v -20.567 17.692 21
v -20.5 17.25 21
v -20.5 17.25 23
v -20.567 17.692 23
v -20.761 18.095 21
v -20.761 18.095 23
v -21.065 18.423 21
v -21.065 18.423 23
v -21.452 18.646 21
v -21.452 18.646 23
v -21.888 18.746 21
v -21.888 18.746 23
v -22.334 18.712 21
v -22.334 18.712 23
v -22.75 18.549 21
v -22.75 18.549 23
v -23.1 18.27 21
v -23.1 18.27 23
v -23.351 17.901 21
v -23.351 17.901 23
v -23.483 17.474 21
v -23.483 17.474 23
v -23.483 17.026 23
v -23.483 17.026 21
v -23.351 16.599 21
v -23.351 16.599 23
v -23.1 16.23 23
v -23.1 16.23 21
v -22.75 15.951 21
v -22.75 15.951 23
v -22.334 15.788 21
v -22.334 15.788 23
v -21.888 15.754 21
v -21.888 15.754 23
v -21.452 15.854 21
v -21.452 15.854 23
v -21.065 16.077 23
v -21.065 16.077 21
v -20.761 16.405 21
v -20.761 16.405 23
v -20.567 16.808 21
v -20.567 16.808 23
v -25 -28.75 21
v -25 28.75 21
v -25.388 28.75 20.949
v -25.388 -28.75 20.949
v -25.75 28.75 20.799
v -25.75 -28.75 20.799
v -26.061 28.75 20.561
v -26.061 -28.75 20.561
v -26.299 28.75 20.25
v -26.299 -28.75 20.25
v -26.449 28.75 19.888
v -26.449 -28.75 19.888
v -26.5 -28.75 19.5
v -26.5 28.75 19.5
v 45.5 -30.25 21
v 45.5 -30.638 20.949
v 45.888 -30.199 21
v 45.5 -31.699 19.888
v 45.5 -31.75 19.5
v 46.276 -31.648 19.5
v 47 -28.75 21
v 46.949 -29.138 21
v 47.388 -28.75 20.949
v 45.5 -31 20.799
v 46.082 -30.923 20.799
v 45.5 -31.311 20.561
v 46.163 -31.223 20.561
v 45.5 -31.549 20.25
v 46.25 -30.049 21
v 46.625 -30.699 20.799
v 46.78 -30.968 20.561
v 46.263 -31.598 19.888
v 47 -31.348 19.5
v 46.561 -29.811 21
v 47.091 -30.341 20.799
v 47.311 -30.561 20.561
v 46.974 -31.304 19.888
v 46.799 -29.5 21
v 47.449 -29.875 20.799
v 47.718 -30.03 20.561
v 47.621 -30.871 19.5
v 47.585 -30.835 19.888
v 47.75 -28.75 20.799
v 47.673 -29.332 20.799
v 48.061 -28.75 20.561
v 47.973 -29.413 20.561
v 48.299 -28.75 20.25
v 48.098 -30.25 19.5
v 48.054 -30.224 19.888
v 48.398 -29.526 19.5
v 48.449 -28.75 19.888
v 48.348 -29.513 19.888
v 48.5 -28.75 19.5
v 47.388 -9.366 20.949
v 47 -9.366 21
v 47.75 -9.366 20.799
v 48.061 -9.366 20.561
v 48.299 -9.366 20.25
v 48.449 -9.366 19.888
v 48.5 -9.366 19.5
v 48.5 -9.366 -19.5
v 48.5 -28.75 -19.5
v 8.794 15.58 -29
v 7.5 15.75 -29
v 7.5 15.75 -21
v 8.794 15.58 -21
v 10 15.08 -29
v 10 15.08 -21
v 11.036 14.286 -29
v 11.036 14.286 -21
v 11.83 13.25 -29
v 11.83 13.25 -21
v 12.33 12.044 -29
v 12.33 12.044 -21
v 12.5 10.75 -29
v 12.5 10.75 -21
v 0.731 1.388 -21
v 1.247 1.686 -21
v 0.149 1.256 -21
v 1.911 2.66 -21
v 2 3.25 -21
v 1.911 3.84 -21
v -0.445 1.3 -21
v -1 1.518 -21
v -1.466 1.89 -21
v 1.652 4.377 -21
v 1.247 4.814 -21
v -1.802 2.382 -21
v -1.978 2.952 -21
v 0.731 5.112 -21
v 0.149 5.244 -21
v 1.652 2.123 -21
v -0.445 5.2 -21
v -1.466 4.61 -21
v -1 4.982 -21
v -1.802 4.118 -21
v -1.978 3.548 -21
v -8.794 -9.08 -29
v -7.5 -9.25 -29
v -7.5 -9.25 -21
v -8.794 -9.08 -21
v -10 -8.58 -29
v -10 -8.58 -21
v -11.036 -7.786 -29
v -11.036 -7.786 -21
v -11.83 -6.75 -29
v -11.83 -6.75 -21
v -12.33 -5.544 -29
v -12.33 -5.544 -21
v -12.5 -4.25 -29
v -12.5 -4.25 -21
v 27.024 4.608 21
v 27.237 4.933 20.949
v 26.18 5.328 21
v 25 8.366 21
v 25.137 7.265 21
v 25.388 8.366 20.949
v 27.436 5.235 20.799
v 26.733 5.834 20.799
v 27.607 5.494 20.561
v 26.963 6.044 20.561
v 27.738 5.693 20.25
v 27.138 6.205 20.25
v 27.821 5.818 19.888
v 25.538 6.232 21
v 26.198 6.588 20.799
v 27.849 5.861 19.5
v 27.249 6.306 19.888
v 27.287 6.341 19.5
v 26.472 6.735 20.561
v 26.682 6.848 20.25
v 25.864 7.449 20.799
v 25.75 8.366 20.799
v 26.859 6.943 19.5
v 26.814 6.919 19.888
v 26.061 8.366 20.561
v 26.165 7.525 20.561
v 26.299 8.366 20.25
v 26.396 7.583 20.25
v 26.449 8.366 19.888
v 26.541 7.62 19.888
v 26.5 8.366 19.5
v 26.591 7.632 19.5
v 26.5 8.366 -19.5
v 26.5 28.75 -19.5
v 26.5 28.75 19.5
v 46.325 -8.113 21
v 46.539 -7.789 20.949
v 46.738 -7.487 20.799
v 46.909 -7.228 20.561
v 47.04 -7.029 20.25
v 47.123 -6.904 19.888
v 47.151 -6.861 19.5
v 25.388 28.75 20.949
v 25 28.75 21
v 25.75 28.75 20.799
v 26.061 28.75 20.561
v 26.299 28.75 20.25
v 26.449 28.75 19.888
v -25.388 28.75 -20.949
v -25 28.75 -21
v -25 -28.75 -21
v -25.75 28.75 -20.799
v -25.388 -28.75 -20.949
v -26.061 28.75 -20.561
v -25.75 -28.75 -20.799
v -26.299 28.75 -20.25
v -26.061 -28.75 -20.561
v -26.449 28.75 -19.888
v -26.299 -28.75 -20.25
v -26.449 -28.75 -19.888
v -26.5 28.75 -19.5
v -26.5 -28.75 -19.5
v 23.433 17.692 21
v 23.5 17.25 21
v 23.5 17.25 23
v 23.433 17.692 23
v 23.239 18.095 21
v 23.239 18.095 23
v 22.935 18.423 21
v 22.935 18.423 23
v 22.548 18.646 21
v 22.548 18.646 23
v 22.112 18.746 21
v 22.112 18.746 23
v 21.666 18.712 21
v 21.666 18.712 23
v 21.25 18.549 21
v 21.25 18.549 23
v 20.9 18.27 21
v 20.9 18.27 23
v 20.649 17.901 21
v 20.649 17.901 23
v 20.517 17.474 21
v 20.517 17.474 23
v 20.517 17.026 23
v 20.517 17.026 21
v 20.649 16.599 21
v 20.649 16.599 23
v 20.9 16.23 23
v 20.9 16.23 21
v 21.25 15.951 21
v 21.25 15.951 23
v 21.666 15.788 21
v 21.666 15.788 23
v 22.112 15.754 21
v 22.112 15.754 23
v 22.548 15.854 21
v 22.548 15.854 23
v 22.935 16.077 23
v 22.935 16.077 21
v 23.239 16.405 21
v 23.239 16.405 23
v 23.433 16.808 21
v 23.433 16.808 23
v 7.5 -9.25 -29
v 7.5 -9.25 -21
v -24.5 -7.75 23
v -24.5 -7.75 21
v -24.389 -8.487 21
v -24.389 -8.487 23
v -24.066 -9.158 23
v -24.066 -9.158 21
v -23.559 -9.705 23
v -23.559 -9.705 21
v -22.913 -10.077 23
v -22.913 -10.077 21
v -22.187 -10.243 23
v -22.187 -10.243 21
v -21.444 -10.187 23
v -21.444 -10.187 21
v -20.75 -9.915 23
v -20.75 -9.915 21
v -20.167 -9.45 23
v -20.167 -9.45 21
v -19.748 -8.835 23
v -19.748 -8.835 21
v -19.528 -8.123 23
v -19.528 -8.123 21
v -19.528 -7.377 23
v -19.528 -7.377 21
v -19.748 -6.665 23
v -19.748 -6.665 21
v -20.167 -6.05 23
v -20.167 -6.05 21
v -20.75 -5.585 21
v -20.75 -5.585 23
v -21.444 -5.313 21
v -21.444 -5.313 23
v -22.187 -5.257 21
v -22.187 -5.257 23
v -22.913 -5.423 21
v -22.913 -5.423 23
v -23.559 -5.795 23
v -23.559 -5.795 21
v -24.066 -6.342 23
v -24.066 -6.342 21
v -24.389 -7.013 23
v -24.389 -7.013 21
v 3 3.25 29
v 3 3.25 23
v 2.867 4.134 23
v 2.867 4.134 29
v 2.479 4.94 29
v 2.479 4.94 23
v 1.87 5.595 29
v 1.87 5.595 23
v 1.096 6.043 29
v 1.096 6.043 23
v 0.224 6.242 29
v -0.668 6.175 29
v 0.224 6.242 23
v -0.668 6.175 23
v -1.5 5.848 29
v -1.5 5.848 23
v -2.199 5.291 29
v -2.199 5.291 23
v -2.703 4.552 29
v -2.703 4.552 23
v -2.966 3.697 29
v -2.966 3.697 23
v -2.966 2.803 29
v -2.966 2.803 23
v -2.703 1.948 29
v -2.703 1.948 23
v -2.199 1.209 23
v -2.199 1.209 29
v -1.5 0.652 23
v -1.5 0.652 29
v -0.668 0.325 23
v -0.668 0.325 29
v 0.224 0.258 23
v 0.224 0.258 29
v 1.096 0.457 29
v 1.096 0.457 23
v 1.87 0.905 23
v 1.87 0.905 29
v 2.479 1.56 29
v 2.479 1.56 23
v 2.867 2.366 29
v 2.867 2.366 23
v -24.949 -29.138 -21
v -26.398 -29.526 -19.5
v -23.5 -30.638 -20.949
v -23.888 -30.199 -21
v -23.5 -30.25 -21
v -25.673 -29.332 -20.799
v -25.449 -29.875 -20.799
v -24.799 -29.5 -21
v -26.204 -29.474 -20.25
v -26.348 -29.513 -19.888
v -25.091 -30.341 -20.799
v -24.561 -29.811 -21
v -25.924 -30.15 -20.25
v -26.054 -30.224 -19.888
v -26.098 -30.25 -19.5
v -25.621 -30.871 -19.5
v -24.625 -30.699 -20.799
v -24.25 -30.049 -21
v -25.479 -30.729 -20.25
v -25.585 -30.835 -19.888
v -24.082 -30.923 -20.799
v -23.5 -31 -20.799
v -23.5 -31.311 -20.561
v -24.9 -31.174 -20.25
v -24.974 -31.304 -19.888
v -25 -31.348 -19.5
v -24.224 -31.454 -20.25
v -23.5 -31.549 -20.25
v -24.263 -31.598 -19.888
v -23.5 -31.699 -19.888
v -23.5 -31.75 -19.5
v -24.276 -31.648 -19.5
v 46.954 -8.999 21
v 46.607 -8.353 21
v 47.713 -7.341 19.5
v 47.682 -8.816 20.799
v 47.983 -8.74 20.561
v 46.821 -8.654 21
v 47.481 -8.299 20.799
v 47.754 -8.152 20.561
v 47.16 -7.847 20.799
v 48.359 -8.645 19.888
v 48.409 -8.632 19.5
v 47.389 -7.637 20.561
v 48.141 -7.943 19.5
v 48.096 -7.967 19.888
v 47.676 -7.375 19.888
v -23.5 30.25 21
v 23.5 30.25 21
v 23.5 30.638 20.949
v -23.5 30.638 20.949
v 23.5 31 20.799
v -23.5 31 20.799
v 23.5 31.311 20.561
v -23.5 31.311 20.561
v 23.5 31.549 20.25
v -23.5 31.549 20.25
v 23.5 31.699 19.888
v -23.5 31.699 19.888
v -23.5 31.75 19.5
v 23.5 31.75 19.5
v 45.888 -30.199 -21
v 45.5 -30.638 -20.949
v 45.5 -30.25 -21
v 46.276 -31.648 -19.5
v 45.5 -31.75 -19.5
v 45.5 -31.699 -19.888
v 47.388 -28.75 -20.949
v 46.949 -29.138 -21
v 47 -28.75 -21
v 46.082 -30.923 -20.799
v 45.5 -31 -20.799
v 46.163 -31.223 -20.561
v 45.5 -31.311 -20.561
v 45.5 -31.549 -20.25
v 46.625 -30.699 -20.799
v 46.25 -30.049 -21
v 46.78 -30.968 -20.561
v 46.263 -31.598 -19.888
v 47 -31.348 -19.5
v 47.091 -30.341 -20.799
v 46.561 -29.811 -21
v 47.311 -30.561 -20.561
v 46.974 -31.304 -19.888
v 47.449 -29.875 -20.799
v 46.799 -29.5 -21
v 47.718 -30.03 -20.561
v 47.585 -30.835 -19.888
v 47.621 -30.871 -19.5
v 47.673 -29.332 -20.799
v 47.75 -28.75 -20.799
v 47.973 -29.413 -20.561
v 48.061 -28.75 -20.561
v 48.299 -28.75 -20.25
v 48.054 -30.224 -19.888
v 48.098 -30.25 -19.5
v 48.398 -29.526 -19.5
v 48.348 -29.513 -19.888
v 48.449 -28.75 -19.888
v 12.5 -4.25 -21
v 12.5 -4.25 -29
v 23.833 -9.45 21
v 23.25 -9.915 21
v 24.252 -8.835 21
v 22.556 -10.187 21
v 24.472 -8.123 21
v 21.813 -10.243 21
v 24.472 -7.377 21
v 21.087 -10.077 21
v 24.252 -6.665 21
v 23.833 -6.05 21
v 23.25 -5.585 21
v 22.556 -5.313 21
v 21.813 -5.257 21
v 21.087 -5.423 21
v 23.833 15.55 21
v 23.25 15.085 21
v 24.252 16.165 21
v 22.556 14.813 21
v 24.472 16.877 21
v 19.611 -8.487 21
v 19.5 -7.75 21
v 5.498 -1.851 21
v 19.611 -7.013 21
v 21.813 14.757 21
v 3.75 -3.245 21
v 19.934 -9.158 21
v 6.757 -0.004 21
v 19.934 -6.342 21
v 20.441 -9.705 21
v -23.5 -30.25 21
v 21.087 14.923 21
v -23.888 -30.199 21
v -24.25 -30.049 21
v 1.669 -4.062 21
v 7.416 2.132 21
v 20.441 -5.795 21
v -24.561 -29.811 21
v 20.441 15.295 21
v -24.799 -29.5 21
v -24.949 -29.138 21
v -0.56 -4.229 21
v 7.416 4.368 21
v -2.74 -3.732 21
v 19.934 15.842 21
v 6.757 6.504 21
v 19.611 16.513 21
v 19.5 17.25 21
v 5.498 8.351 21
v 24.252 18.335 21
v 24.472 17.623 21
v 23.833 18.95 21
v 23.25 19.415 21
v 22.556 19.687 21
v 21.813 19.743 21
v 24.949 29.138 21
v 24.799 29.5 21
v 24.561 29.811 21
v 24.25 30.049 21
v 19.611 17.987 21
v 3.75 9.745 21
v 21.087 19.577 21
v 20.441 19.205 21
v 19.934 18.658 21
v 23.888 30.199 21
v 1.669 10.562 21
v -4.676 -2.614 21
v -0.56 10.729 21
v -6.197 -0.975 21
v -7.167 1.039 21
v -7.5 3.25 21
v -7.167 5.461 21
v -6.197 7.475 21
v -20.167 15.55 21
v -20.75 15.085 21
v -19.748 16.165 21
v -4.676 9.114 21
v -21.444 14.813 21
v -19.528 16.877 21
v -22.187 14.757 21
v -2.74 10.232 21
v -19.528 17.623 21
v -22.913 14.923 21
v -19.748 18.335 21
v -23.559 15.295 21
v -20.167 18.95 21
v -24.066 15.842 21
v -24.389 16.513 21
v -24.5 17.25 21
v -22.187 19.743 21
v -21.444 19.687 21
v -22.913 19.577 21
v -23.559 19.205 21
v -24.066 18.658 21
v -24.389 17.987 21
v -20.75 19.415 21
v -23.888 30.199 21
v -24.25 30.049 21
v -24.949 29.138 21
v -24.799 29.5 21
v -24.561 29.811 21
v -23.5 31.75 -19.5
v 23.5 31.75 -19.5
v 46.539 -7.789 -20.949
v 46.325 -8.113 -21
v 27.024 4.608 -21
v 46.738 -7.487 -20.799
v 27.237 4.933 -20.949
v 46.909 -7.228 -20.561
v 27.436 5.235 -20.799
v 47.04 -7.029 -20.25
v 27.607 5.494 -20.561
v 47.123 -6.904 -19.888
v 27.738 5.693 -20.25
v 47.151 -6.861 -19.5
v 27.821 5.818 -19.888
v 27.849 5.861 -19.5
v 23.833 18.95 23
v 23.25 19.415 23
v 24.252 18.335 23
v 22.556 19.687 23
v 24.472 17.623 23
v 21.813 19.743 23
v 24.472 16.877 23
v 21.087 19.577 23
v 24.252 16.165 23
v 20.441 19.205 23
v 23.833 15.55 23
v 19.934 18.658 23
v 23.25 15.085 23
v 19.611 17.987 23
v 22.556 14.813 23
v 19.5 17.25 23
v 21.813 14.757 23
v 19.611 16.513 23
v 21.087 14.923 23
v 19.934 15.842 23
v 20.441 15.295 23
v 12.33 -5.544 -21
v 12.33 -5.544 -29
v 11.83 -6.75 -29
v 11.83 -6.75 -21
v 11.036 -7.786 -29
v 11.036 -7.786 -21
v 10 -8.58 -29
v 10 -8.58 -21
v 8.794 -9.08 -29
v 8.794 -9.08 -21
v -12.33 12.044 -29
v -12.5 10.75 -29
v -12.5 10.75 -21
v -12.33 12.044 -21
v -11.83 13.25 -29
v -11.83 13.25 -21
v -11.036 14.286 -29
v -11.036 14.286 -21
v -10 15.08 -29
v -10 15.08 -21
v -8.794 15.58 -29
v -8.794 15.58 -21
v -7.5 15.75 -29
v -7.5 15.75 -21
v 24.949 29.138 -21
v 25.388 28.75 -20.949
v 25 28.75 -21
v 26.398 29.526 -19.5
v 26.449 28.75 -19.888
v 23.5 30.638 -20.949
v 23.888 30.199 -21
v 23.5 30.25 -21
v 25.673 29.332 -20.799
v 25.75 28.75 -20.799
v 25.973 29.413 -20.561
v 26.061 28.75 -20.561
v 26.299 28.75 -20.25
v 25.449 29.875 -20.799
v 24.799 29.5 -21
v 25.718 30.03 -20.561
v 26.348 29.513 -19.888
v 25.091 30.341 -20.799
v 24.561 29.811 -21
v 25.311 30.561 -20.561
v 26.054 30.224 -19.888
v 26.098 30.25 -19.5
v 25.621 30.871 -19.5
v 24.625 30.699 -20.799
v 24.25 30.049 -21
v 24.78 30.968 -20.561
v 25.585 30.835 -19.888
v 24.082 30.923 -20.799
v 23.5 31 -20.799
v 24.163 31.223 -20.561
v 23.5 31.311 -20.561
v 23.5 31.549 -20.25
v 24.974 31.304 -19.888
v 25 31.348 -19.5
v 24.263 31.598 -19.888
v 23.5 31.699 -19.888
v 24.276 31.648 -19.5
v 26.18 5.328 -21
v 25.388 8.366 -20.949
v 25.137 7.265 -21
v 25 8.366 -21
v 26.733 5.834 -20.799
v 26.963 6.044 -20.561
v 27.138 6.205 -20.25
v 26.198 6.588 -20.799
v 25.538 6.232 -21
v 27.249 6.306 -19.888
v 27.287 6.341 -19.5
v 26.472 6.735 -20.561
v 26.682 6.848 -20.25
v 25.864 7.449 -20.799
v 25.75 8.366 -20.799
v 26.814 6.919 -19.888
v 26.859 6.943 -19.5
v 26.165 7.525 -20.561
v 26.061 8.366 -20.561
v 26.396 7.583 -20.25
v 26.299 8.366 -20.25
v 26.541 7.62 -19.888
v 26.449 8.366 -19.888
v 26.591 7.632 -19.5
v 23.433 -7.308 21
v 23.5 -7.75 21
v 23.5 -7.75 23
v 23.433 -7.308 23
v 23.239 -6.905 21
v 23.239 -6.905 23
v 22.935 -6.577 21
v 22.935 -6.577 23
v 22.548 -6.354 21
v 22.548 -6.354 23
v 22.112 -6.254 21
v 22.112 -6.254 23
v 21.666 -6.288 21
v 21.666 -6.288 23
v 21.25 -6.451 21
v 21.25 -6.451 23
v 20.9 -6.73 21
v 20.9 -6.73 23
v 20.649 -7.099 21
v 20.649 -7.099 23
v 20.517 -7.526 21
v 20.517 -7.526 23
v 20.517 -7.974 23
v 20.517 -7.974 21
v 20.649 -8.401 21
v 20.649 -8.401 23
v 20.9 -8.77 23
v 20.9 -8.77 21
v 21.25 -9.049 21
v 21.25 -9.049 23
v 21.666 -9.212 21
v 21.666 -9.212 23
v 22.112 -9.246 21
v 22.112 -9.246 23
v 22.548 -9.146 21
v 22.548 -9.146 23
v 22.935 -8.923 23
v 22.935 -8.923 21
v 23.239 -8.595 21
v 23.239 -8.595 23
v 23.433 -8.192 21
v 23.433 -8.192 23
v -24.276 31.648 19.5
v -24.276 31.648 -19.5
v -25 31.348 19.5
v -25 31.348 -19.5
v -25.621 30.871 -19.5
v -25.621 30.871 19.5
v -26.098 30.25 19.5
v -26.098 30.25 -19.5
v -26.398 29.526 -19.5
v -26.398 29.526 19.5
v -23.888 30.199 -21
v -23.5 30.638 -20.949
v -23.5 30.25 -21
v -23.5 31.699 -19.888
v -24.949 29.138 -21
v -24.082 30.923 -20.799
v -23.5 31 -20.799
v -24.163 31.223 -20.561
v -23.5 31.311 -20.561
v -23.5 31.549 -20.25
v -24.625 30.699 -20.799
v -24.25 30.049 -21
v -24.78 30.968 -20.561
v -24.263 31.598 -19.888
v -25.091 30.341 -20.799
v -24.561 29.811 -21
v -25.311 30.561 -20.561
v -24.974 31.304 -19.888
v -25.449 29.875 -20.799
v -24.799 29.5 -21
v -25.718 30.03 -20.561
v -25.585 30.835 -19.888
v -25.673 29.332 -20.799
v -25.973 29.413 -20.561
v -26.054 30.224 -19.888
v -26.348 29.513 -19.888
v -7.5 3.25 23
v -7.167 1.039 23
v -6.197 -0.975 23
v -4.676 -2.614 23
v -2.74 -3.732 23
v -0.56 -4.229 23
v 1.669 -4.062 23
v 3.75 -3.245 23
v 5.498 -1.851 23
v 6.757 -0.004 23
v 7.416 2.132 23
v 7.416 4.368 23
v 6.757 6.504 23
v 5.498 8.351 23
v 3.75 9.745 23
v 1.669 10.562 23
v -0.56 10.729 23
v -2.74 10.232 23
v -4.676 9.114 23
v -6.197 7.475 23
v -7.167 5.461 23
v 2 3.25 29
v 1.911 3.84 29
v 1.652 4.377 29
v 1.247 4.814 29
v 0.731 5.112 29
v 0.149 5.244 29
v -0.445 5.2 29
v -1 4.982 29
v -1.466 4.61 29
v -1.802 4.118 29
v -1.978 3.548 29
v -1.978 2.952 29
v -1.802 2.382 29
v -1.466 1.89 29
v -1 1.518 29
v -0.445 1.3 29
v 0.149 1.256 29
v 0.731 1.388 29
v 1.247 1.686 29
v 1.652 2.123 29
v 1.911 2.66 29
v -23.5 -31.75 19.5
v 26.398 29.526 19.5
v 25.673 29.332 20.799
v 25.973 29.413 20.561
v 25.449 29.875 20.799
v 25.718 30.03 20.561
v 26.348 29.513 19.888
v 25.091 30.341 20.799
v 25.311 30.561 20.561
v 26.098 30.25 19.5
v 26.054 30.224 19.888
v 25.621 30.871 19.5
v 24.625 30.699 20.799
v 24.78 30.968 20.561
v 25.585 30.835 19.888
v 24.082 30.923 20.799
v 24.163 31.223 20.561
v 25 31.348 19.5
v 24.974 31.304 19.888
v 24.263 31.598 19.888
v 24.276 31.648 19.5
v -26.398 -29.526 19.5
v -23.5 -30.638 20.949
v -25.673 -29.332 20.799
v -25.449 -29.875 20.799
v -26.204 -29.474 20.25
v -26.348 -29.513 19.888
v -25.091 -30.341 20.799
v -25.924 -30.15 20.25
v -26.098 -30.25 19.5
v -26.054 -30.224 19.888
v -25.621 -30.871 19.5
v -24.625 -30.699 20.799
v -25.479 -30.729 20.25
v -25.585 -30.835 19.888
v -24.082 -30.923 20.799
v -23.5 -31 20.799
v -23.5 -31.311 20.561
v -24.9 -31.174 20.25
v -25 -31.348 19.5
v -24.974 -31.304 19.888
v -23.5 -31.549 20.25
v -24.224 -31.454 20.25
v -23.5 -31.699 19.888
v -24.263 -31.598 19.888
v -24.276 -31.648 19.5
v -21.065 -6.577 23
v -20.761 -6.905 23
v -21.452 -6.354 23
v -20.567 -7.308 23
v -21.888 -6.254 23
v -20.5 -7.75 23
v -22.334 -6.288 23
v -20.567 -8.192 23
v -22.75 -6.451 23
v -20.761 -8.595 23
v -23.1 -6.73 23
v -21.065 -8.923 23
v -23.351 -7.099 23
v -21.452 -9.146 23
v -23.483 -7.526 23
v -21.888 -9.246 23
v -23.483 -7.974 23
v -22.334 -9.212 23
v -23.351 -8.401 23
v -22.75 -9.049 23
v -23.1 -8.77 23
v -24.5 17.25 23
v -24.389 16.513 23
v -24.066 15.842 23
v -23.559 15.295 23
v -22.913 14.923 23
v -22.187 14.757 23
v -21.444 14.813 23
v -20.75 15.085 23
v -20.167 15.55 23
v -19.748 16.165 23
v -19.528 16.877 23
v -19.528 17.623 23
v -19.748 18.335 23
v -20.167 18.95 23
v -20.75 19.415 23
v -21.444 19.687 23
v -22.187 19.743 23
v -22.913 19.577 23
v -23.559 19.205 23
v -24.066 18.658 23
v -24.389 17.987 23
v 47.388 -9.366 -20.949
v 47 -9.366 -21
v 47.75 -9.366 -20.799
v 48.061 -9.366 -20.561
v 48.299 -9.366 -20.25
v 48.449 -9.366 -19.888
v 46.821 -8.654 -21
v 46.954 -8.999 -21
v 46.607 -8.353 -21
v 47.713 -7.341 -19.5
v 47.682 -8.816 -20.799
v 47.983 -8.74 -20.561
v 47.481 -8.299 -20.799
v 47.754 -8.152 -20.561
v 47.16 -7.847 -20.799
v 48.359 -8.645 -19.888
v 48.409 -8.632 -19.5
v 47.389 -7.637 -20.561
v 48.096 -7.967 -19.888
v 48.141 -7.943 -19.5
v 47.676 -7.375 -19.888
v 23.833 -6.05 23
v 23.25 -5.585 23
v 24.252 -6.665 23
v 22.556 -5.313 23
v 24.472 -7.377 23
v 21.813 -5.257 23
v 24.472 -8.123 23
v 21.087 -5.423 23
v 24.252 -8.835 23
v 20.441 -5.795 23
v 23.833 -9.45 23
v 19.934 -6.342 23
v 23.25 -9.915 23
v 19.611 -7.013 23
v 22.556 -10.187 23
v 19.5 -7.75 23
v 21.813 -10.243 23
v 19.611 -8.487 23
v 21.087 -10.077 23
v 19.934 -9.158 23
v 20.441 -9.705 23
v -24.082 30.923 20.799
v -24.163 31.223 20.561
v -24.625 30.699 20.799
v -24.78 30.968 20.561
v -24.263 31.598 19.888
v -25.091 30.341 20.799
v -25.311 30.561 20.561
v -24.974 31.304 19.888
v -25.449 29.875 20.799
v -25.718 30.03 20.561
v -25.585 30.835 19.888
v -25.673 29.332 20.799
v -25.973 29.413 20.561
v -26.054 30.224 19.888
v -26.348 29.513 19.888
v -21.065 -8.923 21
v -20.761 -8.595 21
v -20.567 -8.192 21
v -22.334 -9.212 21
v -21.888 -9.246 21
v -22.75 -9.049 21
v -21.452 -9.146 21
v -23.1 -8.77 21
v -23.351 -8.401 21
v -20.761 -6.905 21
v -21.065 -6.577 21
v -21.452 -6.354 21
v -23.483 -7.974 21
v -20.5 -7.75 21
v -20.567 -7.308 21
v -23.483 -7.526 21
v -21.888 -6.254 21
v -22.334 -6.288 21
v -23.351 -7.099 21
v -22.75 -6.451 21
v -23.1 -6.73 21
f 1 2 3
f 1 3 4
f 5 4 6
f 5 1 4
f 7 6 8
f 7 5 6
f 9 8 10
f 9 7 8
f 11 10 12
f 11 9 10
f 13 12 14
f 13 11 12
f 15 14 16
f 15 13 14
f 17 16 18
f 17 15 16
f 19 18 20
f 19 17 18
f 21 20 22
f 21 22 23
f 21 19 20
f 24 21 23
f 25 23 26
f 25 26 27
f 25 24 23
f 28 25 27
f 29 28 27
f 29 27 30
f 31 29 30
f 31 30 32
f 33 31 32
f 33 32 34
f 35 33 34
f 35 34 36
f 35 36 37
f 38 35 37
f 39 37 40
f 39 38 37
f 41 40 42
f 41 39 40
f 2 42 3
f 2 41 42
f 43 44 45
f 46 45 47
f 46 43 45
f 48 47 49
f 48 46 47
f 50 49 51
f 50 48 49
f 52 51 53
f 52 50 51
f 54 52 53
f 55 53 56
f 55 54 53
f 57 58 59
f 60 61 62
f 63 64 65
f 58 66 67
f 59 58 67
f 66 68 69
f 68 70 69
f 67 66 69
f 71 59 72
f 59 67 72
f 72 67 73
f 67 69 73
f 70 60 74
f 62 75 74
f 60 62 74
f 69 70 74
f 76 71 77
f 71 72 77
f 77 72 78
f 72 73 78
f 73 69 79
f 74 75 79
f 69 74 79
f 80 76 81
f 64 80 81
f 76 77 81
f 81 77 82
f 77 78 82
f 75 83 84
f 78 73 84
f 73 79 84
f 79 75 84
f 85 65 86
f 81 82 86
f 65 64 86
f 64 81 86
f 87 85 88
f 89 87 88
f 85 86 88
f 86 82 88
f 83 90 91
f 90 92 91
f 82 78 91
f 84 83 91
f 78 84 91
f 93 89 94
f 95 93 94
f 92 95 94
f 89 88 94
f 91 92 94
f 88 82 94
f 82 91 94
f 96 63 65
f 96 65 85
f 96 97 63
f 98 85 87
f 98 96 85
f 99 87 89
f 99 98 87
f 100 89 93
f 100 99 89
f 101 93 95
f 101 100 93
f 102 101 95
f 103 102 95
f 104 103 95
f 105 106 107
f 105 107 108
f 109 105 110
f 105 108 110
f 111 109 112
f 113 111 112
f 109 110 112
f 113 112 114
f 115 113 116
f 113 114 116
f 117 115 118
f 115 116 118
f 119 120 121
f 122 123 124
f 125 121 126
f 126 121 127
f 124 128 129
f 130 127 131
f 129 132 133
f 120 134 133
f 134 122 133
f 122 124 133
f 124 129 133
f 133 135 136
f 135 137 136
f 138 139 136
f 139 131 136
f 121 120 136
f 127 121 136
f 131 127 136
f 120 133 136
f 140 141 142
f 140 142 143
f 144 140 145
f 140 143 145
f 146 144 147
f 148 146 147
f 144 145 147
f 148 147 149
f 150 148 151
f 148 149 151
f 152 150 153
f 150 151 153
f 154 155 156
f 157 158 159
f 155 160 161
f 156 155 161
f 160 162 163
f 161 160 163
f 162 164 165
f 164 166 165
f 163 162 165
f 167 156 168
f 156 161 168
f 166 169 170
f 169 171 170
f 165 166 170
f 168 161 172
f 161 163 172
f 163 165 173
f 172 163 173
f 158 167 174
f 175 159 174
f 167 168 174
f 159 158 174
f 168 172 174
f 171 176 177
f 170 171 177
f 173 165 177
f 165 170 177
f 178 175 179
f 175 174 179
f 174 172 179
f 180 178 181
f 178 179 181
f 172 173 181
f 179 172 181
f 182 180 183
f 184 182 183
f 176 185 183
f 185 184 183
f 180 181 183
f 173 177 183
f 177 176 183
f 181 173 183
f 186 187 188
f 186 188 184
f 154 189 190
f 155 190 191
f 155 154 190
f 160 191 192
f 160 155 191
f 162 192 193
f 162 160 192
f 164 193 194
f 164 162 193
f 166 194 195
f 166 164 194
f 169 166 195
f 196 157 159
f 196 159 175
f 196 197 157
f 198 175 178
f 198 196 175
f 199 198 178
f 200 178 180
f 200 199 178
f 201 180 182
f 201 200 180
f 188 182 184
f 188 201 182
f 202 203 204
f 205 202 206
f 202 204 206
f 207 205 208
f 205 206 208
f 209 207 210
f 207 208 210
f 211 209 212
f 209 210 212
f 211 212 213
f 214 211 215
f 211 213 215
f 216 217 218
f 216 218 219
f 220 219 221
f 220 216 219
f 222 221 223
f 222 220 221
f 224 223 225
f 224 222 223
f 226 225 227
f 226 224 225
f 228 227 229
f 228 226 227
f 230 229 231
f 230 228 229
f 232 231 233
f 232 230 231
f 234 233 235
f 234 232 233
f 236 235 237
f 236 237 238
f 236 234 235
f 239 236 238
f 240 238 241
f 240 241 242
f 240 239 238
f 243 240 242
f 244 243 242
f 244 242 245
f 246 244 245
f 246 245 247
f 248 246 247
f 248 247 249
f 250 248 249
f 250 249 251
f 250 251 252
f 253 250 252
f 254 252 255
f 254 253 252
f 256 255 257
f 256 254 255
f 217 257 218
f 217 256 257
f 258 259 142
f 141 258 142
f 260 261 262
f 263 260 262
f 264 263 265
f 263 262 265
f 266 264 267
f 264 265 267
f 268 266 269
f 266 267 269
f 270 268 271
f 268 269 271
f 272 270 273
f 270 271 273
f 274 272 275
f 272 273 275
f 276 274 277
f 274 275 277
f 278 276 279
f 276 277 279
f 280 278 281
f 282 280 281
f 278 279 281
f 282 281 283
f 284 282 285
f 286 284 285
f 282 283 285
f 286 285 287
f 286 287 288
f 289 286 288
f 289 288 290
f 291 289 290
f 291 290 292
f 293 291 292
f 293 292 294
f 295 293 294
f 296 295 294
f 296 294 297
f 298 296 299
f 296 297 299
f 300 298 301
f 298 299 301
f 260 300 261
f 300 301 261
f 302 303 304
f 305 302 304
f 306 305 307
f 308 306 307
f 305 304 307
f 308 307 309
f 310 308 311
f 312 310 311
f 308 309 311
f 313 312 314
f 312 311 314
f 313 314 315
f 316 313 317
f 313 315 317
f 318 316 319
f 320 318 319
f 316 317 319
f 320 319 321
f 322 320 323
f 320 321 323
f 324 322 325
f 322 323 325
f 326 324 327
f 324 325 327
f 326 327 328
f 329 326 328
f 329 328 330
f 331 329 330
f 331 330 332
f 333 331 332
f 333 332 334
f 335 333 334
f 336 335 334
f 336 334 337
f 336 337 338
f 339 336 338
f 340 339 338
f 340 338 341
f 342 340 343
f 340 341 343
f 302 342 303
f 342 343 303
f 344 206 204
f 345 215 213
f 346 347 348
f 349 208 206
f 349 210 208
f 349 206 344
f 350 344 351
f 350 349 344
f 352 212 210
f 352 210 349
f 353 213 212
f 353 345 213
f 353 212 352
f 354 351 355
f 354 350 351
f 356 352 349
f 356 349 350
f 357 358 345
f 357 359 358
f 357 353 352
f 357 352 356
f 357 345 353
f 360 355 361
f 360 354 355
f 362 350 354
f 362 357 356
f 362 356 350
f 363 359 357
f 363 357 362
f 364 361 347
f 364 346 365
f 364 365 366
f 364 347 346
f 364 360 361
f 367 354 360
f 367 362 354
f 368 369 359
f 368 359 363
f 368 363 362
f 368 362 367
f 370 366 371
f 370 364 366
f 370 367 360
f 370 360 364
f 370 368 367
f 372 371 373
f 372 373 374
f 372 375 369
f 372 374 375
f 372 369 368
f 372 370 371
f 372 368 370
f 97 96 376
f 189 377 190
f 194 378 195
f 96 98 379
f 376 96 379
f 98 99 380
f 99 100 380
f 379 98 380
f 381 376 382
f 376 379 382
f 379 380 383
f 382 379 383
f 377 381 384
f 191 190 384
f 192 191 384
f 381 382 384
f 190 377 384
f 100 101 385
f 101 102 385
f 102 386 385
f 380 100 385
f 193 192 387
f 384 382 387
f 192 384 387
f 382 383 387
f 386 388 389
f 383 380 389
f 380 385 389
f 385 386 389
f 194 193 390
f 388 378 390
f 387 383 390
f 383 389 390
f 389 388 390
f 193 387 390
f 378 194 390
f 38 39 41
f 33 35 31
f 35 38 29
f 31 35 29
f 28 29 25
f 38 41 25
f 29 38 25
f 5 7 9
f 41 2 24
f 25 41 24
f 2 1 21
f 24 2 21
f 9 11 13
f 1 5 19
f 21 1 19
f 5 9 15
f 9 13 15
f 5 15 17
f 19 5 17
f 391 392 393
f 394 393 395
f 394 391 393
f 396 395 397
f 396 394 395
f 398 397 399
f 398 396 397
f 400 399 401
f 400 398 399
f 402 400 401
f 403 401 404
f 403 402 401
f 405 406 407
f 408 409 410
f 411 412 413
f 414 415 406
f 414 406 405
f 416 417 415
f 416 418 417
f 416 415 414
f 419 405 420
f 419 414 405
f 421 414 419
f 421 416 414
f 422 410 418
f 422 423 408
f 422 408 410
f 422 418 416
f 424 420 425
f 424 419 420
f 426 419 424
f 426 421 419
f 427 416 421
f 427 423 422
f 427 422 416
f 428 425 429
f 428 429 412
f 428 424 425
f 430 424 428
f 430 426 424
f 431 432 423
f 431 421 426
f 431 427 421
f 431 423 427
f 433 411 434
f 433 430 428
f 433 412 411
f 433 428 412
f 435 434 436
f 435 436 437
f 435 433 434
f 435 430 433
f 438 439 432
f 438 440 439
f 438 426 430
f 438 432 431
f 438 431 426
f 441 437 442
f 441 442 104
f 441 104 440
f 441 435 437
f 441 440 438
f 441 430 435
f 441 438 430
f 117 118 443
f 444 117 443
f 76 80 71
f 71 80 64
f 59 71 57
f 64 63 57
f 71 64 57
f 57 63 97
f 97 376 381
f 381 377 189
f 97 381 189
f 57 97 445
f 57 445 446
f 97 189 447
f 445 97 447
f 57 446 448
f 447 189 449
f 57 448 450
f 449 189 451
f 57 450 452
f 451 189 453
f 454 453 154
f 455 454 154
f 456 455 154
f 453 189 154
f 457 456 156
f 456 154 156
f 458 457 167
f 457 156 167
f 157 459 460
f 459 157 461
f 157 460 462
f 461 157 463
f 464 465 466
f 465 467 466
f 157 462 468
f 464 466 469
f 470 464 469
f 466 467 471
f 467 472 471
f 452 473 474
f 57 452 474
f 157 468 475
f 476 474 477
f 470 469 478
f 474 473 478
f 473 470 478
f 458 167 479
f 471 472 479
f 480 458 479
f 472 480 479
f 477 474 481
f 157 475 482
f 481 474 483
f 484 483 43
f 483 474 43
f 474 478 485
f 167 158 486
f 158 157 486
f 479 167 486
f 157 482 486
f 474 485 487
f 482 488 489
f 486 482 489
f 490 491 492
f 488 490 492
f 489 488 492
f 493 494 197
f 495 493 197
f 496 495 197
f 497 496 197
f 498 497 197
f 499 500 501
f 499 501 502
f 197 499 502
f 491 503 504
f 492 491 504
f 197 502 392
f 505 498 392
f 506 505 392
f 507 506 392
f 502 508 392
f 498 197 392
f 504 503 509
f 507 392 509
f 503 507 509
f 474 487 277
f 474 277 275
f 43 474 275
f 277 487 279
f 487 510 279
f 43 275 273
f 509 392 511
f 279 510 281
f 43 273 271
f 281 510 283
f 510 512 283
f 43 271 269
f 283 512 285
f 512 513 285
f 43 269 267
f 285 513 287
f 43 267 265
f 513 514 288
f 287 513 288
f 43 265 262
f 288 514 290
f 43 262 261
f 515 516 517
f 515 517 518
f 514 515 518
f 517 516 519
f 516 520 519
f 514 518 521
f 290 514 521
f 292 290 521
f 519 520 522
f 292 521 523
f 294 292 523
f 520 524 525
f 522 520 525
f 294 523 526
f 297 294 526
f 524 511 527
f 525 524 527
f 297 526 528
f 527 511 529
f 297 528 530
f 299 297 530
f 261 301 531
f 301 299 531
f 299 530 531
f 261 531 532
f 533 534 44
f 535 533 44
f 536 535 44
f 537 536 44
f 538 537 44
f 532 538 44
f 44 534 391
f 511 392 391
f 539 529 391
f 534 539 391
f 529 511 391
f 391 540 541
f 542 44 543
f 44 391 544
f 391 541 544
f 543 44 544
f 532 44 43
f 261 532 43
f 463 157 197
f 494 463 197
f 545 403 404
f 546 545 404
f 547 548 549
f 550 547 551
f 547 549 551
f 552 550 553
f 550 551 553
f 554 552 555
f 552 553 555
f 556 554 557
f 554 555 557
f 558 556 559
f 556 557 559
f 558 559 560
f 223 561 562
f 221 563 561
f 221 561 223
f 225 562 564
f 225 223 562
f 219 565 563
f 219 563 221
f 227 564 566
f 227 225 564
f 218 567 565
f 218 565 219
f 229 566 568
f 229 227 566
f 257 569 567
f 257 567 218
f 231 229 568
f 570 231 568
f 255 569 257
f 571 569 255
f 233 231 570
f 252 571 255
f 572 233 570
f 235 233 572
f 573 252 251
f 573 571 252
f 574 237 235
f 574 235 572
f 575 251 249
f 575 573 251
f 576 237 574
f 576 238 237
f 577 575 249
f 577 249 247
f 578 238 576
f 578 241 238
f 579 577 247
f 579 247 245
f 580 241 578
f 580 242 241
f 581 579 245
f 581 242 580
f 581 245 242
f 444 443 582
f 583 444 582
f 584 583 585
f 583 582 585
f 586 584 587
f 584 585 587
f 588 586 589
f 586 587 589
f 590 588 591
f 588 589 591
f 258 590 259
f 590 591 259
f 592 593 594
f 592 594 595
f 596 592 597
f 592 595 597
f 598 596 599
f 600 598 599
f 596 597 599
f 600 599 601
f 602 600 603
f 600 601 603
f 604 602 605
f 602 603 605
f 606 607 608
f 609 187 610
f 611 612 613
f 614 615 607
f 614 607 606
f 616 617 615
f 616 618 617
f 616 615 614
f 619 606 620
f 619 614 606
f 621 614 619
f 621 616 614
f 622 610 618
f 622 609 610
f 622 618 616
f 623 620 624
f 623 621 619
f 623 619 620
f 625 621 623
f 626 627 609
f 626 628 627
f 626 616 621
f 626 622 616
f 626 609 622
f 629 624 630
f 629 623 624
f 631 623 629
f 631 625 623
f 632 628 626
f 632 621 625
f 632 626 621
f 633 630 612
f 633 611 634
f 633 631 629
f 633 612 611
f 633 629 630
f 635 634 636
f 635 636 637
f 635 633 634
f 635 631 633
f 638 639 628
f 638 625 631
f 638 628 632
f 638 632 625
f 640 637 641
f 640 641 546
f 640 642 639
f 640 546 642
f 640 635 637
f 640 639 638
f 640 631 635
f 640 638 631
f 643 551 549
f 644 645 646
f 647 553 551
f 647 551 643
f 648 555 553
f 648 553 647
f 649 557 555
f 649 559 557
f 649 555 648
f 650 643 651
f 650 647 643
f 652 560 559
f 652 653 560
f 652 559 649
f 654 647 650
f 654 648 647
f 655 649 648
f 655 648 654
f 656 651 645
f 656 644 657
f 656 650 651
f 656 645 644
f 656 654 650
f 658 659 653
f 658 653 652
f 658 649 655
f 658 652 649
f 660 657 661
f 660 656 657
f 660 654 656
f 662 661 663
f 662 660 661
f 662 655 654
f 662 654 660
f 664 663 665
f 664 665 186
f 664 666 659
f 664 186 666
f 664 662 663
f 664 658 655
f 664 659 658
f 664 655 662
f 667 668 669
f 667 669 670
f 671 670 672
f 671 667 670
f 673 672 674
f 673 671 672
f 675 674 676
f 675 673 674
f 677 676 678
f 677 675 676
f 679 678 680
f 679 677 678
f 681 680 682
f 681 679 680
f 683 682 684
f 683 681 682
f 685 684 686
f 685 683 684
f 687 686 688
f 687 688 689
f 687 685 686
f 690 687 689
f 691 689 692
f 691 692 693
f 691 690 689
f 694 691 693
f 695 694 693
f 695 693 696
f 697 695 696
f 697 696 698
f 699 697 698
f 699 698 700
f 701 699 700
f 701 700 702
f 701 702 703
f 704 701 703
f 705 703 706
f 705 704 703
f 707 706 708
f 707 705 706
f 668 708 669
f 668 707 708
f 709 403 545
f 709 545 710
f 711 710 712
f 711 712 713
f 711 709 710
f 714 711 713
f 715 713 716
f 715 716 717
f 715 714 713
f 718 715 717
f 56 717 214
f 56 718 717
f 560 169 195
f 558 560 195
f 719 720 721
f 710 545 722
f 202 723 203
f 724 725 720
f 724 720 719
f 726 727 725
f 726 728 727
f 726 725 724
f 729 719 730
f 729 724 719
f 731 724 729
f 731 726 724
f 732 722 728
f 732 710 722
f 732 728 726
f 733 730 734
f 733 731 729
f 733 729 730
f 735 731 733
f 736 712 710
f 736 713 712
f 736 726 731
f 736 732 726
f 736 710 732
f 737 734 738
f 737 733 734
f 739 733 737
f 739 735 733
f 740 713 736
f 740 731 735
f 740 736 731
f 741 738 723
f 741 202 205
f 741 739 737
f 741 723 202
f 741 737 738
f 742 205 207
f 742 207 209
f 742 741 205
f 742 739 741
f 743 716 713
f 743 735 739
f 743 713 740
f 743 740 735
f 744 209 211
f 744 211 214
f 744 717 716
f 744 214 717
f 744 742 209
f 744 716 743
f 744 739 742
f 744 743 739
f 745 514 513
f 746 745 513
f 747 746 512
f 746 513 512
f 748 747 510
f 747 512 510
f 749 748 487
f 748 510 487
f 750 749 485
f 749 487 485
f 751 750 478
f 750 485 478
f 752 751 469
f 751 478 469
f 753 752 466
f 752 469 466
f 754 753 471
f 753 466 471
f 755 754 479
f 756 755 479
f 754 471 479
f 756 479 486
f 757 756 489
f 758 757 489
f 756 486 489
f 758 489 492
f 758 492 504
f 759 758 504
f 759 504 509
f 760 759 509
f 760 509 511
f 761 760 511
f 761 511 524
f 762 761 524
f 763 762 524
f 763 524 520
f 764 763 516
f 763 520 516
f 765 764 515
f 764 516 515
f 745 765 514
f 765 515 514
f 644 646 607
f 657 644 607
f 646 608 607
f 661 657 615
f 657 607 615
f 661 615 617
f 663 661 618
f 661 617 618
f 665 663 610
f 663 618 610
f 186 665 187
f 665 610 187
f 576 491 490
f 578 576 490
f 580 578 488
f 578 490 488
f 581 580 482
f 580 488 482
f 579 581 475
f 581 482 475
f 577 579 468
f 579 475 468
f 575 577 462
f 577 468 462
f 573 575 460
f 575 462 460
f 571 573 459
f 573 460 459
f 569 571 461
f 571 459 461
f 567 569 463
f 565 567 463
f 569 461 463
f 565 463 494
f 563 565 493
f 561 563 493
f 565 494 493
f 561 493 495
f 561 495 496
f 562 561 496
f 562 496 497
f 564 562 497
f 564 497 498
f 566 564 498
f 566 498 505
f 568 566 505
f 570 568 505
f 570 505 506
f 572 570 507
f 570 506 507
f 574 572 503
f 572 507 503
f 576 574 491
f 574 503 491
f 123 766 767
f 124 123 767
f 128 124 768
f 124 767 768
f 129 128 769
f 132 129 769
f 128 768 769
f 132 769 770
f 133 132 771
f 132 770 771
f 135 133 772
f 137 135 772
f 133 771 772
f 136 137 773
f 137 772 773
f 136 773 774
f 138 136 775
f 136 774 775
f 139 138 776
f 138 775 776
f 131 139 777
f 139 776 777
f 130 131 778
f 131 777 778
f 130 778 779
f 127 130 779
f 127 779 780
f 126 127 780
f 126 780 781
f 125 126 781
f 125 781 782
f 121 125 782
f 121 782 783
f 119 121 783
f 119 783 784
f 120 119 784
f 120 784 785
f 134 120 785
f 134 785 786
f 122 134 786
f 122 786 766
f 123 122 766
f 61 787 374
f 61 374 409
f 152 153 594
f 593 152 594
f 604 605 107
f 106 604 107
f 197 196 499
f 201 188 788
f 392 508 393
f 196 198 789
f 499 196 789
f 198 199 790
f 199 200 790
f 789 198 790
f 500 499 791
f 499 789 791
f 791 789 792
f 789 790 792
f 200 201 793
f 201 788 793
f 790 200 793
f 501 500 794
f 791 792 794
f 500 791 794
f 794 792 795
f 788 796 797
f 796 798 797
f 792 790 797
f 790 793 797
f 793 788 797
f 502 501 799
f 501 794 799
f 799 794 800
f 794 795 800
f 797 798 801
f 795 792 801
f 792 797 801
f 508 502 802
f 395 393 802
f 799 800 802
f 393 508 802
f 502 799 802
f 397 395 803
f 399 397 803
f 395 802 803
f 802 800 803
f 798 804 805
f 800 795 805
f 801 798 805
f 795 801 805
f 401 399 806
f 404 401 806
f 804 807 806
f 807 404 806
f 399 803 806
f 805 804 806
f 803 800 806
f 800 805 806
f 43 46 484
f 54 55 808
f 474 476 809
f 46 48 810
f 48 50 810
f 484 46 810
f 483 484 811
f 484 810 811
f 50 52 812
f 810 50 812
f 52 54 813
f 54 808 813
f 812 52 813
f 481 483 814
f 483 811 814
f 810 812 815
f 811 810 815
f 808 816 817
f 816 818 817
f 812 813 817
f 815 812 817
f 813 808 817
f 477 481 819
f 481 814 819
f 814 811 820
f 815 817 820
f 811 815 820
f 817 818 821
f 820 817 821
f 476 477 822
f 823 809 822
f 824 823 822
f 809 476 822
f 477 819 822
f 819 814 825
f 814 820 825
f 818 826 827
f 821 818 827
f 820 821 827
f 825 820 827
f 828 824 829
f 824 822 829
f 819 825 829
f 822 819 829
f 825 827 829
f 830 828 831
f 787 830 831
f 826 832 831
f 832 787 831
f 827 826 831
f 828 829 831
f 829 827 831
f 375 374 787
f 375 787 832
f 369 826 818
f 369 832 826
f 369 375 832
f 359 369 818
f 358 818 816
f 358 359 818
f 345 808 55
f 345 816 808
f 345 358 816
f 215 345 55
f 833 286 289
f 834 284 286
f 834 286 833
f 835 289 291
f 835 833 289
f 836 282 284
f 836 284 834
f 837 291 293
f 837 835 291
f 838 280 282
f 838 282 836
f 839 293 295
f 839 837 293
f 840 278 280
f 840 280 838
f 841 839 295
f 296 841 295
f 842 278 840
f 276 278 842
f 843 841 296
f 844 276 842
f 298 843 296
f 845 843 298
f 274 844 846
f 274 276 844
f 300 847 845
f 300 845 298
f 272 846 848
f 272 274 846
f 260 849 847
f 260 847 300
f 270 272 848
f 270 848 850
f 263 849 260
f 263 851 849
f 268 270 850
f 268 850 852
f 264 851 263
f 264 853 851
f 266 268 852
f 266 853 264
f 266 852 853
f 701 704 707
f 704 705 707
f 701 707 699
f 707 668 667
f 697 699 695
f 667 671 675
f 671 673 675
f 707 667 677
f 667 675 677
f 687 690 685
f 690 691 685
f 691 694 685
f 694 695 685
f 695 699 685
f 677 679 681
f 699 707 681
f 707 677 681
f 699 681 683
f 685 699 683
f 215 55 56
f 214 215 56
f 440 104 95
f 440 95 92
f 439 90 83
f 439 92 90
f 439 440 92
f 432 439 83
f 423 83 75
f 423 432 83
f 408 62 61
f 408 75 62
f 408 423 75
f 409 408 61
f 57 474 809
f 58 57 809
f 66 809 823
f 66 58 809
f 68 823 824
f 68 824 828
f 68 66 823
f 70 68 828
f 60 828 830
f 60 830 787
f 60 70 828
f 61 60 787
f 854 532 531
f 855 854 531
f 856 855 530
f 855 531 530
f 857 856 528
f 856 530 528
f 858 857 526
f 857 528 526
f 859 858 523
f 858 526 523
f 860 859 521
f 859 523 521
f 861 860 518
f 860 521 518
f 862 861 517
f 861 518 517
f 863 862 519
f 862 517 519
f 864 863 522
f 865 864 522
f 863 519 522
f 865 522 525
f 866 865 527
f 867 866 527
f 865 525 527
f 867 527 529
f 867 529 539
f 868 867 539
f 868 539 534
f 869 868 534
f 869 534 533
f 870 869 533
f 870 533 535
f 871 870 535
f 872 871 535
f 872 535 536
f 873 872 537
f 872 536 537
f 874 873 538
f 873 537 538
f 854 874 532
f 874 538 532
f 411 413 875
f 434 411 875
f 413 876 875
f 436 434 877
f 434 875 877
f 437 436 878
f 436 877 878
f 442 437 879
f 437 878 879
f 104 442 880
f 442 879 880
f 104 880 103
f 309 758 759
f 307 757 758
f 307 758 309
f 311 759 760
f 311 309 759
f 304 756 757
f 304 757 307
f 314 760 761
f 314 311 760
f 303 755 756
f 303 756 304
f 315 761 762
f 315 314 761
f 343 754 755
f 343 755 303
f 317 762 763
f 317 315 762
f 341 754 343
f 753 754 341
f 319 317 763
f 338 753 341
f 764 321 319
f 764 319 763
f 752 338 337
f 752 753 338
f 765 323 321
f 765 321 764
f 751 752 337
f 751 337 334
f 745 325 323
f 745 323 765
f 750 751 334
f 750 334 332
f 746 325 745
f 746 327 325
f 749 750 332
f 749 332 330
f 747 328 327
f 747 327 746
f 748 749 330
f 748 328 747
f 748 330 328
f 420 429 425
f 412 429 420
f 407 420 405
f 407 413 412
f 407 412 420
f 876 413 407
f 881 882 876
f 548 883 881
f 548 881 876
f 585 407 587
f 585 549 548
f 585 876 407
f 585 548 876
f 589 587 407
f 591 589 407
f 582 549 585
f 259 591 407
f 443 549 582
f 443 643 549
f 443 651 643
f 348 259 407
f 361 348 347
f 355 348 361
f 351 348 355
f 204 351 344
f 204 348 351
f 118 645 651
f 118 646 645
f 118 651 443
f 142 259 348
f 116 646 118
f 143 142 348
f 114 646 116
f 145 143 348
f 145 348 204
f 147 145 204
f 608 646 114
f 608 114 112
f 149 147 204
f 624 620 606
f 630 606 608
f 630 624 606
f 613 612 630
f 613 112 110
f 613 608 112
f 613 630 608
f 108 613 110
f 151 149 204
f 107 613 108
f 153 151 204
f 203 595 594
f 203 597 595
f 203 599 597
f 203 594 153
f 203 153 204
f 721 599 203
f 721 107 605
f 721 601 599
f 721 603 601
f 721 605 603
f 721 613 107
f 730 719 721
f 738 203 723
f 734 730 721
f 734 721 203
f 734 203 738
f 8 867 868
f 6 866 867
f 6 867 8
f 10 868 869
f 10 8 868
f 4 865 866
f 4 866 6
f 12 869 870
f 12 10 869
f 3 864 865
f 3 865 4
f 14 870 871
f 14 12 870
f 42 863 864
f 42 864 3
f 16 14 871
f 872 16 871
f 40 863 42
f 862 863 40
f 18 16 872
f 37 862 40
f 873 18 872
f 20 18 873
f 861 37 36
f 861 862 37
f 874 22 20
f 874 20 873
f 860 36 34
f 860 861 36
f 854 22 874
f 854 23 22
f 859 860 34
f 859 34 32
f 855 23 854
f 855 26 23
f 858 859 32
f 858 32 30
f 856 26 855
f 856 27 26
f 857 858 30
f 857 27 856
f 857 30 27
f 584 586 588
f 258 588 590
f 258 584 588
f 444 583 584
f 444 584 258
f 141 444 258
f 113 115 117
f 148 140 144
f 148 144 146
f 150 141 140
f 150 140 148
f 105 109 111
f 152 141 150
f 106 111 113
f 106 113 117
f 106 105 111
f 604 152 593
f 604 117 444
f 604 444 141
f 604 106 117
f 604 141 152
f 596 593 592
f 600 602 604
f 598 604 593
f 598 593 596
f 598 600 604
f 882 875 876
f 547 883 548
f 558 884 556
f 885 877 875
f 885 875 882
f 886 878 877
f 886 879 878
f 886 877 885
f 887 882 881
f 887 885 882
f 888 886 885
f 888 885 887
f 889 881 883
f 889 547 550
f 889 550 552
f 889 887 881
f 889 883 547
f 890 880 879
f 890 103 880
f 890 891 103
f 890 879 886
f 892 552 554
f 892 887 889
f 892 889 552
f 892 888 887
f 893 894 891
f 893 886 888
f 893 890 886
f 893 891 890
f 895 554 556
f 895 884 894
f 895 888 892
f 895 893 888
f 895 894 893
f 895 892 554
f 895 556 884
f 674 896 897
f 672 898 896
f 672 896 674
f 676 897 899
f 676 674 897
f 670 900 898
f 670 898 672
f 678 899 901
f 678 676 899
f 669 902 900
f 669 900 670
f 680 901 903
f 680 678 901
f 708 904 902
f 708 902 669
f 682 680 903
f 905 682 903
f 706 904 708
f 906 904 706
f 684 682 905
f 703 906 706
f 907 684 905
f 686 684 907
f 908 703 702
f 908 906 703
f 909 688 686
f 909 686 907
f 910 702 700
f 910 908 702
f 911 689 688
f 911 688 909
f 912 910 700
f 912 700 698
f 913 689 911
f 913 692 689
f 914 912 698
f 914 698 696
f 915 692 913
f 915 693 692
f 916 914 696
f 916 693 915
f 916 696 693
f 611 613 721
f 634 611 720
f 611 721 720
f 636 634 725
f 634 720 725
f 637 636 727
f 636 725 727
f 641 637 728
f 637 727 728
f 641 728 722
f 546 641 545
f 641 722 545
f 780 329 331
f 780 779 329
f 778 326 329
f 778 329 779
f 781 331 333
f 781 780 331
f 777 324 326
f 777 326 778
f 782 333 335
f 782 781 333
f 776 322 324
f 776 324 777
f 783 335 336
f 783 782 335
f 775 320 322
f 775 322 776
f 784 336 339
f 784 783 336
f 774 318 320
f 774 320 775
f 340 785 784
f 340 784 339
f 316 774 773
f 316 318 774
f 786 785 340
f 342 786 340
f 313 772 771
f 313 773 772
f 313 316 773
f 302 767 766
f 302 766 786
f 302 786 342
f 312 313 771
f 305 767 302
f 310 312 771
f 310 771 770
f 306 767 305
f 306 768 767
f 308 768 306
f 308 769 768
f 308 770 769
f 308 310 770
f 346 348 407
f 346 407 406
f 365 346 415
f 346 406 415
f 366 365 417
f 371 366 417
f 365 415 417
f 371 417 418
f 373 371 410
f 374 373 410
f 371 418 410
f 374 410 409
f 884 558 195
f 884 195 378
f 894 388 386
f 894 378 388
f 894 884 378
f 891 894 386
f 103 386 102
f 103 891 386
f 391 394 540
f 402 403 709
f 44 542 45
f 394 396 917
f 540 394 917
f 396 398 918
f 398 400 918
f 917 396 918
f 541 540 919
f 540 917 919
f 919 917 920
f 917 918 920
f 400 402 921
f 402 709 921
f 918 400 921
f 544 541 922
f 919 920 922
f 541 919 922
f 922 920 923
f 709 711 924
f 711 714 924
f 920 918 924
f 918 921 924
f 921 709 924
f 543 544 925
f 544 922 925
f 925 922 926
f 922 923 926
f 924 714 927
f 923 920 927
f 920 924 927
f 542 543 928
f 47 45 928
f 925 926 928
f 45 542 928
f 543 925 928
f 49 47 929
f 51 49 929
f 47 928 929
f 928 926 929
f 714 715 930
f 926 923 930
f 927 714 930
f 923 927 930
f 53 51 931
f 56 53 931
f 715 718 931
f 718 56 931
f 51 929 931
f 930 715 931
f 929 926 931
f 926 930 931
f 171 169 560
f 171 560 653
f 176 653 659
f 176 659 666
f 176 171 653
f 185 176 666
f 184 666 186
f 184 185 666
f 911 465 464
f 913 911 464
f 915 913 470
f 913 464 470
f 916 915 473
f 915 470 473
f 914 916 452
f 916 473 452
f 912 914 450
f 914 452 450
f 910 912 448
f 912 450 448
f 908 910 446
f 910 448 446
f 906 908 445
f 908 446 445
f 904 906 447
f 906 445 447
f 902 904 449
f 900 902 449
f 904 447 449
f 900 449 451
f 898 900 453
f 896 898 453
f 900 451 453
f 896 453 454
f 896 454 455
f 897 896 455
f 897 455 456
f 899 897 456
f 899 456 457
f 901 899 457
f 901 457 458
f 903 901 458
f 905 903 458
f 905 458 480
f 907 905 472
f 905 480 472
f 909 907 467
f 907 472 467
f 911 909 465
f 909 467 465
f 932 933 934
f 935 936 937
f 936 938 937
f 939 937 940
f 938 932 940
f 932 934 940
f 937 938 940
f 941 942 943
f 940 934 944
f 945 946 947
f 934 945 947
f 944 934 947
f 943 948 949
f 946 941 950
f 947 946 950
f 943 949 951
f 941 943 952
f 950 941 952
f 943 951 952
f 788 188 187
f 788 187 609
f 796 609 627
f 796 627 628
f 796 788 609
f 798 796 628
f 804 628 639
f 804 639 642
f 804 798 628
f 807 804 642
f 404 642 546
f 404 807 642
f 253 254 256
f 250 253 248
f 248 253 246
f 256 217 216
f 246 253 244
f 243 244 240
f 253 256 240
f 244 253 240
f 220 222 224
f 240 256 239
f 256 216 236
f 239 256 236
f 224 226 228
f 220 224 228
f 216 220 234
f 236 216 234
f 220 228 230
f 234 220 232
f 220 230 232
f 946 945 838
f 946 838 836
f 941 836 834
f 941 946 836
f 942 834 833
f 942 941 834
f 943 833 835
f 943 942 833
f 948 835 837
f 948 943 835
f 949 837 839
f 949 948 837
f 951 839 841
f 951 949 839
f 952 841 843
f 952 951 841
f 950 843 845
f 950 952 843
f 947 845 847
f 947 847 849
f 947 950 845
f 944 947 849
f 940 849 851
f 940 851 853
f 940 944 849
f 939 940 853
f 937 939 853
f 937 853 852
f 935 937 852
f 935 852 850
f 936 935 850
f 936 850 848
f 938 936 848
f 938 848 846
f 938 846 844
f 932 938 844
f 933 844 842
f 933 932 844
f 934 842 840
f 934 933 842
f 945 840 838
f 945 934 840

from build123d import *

# Parameters (mm, degrees)
BOSS_EXTRUDE1_DEPTH = 21
SKETCH3_R           = 2.5
SKETCH3_R_2         = 1.5
BOSS_EXTRUDE2_DEPTH = 2
SKETCH5_R           = 7.5
BOSS_EXTRUDE4_DEPTH = 2
FILLET1_R           = 3
FILLET2_R           = 1.5
SKETCH7_R           = 3
BOSS_EXTRUDE6_DEPTH = 6
SKETCH8_R           = 2
CUT_EXTRUDE2_DEPTH  = 77.552677941
BOSS_EXTRUDE7_DEPTH = 8


with BuildPart() as part:
    # Sketch2 → Boss-Extrude1 (new, symmetric)
    with BuildSketch(Plane.XY):
        Polygon((26.5, 6.75), (48.5, -7.75), (48.5, -31.75), (26.5, -31.75), (-26.5, -31.75), (-26.5, 31.75), (26.5, 31.75), align=None)
    extrude(amount=BOSS_EXTRUDE1_DEPTH, both=True)

    # Sketch3 → Boss-Extrude2 (add)
    # profile 1 of 4: a face of its own
    with BuildSketch(Plane.XY.offset(21)):
        with Locations(Location((-22, 17.25, 0), (0, 0, 180))):
            Circle(SKETCH3_R)
        with Locations((-22, 17.25)):
            Circle(SKETCH3_R_2, mode=Mode.SUBTRACT)
    # profile 2 of 4: a face of its own
    with BuildSketch(Plane.XY.offset(21)):
        with Locations(Location((22, 17.25, 0), (0, 0, 180))):
            Circle(SKETCH3_R)
        with Locations((22, 17.25)):
            Circle(SKETCH3_R_2, mode=Mode.SUBTRACT)
    # profile 3 of 4: a face of its own
    with BuildSketch(Plane.XY.offset(21)):
        with Locations(Location((-22, -7.75, 0), (0, 0, 180))):
            Circle(SKETCH3_R)
        with Locations((-22, -7.75)):
            Circle(SKETCH3_R_2, mode=Mode.SUBTRACT)
    # profile 4 of 4: a face of its own
    with BuildSketch(Plane.XY.offset(21)):
        with Locations(Location((22, -7.75, 0), (0, 0, 180))):
            Circle(SKETCH3_R)
        with Locations((22, -7.75)):
            Circle(SKETCH3_R_2, mode=Mode.SUBTRACT)
    extrude(amount=BOSS_EXTRUDE2_DEPTH)

    # Sketch5 → Boss-Extrude4 (add)
    with BuildSketch(Plane.XY.offset(21)):
        with Locations(Location((0, 3.25, 0), (0, 0, 180))):
            Circle(SKETCH5_R)
    extrude(amount=BOSS_EXTRUDE4_DEPTH)

    # Fillet1
    fillet1_edges = [part.edges().sort_by_distance(p)[0] for p in [
        (26.5, 6.75, 0),
        (48.5, -7.75, 0),
        (48.5, -31.75, 0),
        (-26.5, -31.75, 0),
        (-26.5, 31.75, 0),
        (26.5, 31.75, 0),
    ]]
    fillet(fillet1_edges, radius=FILLET1_R)

    # Fillet2
    fillet2_edges = [part.edges().sort_by_distance(p)[0] for p in [
        (11, -31.75, -21),
        (11, -31.75, 21),
        (26.5, 18.557860744, -21),
        (37.5, -0.5, -21),
        (48.5, -19.057860744, -21),
        (-26.5, 0, -21),
        (0, 31.75, -21),
        (25.621320344, 30.871320344, -21),
        (48.141289482, -7.943192097, -21),
        (47.621320344, -30.871320344, -21),
        (-25.621320344, 30.871320344, -21),
        (-25.621320344, -30.871320344, -21),
        (-26.5, 0, 21),
        (26.5, 18.557860744, 21),
        (0, 31.75, 21),
        (48.5, -19.057860744, 21),
        (37.5, -0.5, 21),
        (25.621320344, 30.871320344, 21),
        (48.141289482, -7.943192097, 21),
        (47.621320344, -30.871320344, 21),
        (-25.621320344, 30.871320344, 21),
        (-25.621320344, -30.871320344, 21),
        (26.858710518, 6.943192097, -21),
        (26.858710518, 6.943192097, 21),
    ]]
    fillet(fillet2_edges, radius=FILLET2_R)

    # Sketch7 → Boss-Extrude6 (add)
    with BuildSketch(Plane.XY.offset(23)):
        with Locations((0, 3.25)):
            Circle(SKETCH7_R)
    extrude(amount=BOSS_EXTRUDE6_DEPTH)

    # Sketch8 → Cut-Extrude2 (cut, through all)
    with BuildSketch(Plane.XY.offset(29)):
        with Locations((0, 3.25)):
            Circle(SKETCH8_R)
    extrude(amount=-CUT_EXTRUDE2_DEPTH, mode=Mode.SUBTRACT)

    # Sketch9 → Boss-Extrude7 (add)
    with BuildSketch(Plane(origin=(0, 0, -21), x_dir=(-1, 0, 0), z_dir=(0, 0, -1))):
        with BuildLine():
            Line((-7.5, -9.25), (7.5, -9.25))
            ThreePointArc((7.5, -9.25), (11.035533906, -7.785533906), (12.5, -4.25))
            Line((12.5, -4.25), (12.5, 10.75))
            ThreePointArc((12.5, 10.75), (11.035533906, 14.285533906), (7.5, 15.75))
            Line((7.5, 15.75), (-7.5, 15.75))
            ThreePointArc((-7.5, 15.75), (-11.035533906, 14.285533906), (-12.5, 10.75))
            Line((-12.5, 10.75), (-12.5, -4.25))
            ThreePointArc((-12.5, -4.25), (-11.035533906, -7.785533906), (-7.5, -9.25))
        make_face()
    extrude(amount=BOSS_EXTRUDE7_DEPTH)


solid = part.part
